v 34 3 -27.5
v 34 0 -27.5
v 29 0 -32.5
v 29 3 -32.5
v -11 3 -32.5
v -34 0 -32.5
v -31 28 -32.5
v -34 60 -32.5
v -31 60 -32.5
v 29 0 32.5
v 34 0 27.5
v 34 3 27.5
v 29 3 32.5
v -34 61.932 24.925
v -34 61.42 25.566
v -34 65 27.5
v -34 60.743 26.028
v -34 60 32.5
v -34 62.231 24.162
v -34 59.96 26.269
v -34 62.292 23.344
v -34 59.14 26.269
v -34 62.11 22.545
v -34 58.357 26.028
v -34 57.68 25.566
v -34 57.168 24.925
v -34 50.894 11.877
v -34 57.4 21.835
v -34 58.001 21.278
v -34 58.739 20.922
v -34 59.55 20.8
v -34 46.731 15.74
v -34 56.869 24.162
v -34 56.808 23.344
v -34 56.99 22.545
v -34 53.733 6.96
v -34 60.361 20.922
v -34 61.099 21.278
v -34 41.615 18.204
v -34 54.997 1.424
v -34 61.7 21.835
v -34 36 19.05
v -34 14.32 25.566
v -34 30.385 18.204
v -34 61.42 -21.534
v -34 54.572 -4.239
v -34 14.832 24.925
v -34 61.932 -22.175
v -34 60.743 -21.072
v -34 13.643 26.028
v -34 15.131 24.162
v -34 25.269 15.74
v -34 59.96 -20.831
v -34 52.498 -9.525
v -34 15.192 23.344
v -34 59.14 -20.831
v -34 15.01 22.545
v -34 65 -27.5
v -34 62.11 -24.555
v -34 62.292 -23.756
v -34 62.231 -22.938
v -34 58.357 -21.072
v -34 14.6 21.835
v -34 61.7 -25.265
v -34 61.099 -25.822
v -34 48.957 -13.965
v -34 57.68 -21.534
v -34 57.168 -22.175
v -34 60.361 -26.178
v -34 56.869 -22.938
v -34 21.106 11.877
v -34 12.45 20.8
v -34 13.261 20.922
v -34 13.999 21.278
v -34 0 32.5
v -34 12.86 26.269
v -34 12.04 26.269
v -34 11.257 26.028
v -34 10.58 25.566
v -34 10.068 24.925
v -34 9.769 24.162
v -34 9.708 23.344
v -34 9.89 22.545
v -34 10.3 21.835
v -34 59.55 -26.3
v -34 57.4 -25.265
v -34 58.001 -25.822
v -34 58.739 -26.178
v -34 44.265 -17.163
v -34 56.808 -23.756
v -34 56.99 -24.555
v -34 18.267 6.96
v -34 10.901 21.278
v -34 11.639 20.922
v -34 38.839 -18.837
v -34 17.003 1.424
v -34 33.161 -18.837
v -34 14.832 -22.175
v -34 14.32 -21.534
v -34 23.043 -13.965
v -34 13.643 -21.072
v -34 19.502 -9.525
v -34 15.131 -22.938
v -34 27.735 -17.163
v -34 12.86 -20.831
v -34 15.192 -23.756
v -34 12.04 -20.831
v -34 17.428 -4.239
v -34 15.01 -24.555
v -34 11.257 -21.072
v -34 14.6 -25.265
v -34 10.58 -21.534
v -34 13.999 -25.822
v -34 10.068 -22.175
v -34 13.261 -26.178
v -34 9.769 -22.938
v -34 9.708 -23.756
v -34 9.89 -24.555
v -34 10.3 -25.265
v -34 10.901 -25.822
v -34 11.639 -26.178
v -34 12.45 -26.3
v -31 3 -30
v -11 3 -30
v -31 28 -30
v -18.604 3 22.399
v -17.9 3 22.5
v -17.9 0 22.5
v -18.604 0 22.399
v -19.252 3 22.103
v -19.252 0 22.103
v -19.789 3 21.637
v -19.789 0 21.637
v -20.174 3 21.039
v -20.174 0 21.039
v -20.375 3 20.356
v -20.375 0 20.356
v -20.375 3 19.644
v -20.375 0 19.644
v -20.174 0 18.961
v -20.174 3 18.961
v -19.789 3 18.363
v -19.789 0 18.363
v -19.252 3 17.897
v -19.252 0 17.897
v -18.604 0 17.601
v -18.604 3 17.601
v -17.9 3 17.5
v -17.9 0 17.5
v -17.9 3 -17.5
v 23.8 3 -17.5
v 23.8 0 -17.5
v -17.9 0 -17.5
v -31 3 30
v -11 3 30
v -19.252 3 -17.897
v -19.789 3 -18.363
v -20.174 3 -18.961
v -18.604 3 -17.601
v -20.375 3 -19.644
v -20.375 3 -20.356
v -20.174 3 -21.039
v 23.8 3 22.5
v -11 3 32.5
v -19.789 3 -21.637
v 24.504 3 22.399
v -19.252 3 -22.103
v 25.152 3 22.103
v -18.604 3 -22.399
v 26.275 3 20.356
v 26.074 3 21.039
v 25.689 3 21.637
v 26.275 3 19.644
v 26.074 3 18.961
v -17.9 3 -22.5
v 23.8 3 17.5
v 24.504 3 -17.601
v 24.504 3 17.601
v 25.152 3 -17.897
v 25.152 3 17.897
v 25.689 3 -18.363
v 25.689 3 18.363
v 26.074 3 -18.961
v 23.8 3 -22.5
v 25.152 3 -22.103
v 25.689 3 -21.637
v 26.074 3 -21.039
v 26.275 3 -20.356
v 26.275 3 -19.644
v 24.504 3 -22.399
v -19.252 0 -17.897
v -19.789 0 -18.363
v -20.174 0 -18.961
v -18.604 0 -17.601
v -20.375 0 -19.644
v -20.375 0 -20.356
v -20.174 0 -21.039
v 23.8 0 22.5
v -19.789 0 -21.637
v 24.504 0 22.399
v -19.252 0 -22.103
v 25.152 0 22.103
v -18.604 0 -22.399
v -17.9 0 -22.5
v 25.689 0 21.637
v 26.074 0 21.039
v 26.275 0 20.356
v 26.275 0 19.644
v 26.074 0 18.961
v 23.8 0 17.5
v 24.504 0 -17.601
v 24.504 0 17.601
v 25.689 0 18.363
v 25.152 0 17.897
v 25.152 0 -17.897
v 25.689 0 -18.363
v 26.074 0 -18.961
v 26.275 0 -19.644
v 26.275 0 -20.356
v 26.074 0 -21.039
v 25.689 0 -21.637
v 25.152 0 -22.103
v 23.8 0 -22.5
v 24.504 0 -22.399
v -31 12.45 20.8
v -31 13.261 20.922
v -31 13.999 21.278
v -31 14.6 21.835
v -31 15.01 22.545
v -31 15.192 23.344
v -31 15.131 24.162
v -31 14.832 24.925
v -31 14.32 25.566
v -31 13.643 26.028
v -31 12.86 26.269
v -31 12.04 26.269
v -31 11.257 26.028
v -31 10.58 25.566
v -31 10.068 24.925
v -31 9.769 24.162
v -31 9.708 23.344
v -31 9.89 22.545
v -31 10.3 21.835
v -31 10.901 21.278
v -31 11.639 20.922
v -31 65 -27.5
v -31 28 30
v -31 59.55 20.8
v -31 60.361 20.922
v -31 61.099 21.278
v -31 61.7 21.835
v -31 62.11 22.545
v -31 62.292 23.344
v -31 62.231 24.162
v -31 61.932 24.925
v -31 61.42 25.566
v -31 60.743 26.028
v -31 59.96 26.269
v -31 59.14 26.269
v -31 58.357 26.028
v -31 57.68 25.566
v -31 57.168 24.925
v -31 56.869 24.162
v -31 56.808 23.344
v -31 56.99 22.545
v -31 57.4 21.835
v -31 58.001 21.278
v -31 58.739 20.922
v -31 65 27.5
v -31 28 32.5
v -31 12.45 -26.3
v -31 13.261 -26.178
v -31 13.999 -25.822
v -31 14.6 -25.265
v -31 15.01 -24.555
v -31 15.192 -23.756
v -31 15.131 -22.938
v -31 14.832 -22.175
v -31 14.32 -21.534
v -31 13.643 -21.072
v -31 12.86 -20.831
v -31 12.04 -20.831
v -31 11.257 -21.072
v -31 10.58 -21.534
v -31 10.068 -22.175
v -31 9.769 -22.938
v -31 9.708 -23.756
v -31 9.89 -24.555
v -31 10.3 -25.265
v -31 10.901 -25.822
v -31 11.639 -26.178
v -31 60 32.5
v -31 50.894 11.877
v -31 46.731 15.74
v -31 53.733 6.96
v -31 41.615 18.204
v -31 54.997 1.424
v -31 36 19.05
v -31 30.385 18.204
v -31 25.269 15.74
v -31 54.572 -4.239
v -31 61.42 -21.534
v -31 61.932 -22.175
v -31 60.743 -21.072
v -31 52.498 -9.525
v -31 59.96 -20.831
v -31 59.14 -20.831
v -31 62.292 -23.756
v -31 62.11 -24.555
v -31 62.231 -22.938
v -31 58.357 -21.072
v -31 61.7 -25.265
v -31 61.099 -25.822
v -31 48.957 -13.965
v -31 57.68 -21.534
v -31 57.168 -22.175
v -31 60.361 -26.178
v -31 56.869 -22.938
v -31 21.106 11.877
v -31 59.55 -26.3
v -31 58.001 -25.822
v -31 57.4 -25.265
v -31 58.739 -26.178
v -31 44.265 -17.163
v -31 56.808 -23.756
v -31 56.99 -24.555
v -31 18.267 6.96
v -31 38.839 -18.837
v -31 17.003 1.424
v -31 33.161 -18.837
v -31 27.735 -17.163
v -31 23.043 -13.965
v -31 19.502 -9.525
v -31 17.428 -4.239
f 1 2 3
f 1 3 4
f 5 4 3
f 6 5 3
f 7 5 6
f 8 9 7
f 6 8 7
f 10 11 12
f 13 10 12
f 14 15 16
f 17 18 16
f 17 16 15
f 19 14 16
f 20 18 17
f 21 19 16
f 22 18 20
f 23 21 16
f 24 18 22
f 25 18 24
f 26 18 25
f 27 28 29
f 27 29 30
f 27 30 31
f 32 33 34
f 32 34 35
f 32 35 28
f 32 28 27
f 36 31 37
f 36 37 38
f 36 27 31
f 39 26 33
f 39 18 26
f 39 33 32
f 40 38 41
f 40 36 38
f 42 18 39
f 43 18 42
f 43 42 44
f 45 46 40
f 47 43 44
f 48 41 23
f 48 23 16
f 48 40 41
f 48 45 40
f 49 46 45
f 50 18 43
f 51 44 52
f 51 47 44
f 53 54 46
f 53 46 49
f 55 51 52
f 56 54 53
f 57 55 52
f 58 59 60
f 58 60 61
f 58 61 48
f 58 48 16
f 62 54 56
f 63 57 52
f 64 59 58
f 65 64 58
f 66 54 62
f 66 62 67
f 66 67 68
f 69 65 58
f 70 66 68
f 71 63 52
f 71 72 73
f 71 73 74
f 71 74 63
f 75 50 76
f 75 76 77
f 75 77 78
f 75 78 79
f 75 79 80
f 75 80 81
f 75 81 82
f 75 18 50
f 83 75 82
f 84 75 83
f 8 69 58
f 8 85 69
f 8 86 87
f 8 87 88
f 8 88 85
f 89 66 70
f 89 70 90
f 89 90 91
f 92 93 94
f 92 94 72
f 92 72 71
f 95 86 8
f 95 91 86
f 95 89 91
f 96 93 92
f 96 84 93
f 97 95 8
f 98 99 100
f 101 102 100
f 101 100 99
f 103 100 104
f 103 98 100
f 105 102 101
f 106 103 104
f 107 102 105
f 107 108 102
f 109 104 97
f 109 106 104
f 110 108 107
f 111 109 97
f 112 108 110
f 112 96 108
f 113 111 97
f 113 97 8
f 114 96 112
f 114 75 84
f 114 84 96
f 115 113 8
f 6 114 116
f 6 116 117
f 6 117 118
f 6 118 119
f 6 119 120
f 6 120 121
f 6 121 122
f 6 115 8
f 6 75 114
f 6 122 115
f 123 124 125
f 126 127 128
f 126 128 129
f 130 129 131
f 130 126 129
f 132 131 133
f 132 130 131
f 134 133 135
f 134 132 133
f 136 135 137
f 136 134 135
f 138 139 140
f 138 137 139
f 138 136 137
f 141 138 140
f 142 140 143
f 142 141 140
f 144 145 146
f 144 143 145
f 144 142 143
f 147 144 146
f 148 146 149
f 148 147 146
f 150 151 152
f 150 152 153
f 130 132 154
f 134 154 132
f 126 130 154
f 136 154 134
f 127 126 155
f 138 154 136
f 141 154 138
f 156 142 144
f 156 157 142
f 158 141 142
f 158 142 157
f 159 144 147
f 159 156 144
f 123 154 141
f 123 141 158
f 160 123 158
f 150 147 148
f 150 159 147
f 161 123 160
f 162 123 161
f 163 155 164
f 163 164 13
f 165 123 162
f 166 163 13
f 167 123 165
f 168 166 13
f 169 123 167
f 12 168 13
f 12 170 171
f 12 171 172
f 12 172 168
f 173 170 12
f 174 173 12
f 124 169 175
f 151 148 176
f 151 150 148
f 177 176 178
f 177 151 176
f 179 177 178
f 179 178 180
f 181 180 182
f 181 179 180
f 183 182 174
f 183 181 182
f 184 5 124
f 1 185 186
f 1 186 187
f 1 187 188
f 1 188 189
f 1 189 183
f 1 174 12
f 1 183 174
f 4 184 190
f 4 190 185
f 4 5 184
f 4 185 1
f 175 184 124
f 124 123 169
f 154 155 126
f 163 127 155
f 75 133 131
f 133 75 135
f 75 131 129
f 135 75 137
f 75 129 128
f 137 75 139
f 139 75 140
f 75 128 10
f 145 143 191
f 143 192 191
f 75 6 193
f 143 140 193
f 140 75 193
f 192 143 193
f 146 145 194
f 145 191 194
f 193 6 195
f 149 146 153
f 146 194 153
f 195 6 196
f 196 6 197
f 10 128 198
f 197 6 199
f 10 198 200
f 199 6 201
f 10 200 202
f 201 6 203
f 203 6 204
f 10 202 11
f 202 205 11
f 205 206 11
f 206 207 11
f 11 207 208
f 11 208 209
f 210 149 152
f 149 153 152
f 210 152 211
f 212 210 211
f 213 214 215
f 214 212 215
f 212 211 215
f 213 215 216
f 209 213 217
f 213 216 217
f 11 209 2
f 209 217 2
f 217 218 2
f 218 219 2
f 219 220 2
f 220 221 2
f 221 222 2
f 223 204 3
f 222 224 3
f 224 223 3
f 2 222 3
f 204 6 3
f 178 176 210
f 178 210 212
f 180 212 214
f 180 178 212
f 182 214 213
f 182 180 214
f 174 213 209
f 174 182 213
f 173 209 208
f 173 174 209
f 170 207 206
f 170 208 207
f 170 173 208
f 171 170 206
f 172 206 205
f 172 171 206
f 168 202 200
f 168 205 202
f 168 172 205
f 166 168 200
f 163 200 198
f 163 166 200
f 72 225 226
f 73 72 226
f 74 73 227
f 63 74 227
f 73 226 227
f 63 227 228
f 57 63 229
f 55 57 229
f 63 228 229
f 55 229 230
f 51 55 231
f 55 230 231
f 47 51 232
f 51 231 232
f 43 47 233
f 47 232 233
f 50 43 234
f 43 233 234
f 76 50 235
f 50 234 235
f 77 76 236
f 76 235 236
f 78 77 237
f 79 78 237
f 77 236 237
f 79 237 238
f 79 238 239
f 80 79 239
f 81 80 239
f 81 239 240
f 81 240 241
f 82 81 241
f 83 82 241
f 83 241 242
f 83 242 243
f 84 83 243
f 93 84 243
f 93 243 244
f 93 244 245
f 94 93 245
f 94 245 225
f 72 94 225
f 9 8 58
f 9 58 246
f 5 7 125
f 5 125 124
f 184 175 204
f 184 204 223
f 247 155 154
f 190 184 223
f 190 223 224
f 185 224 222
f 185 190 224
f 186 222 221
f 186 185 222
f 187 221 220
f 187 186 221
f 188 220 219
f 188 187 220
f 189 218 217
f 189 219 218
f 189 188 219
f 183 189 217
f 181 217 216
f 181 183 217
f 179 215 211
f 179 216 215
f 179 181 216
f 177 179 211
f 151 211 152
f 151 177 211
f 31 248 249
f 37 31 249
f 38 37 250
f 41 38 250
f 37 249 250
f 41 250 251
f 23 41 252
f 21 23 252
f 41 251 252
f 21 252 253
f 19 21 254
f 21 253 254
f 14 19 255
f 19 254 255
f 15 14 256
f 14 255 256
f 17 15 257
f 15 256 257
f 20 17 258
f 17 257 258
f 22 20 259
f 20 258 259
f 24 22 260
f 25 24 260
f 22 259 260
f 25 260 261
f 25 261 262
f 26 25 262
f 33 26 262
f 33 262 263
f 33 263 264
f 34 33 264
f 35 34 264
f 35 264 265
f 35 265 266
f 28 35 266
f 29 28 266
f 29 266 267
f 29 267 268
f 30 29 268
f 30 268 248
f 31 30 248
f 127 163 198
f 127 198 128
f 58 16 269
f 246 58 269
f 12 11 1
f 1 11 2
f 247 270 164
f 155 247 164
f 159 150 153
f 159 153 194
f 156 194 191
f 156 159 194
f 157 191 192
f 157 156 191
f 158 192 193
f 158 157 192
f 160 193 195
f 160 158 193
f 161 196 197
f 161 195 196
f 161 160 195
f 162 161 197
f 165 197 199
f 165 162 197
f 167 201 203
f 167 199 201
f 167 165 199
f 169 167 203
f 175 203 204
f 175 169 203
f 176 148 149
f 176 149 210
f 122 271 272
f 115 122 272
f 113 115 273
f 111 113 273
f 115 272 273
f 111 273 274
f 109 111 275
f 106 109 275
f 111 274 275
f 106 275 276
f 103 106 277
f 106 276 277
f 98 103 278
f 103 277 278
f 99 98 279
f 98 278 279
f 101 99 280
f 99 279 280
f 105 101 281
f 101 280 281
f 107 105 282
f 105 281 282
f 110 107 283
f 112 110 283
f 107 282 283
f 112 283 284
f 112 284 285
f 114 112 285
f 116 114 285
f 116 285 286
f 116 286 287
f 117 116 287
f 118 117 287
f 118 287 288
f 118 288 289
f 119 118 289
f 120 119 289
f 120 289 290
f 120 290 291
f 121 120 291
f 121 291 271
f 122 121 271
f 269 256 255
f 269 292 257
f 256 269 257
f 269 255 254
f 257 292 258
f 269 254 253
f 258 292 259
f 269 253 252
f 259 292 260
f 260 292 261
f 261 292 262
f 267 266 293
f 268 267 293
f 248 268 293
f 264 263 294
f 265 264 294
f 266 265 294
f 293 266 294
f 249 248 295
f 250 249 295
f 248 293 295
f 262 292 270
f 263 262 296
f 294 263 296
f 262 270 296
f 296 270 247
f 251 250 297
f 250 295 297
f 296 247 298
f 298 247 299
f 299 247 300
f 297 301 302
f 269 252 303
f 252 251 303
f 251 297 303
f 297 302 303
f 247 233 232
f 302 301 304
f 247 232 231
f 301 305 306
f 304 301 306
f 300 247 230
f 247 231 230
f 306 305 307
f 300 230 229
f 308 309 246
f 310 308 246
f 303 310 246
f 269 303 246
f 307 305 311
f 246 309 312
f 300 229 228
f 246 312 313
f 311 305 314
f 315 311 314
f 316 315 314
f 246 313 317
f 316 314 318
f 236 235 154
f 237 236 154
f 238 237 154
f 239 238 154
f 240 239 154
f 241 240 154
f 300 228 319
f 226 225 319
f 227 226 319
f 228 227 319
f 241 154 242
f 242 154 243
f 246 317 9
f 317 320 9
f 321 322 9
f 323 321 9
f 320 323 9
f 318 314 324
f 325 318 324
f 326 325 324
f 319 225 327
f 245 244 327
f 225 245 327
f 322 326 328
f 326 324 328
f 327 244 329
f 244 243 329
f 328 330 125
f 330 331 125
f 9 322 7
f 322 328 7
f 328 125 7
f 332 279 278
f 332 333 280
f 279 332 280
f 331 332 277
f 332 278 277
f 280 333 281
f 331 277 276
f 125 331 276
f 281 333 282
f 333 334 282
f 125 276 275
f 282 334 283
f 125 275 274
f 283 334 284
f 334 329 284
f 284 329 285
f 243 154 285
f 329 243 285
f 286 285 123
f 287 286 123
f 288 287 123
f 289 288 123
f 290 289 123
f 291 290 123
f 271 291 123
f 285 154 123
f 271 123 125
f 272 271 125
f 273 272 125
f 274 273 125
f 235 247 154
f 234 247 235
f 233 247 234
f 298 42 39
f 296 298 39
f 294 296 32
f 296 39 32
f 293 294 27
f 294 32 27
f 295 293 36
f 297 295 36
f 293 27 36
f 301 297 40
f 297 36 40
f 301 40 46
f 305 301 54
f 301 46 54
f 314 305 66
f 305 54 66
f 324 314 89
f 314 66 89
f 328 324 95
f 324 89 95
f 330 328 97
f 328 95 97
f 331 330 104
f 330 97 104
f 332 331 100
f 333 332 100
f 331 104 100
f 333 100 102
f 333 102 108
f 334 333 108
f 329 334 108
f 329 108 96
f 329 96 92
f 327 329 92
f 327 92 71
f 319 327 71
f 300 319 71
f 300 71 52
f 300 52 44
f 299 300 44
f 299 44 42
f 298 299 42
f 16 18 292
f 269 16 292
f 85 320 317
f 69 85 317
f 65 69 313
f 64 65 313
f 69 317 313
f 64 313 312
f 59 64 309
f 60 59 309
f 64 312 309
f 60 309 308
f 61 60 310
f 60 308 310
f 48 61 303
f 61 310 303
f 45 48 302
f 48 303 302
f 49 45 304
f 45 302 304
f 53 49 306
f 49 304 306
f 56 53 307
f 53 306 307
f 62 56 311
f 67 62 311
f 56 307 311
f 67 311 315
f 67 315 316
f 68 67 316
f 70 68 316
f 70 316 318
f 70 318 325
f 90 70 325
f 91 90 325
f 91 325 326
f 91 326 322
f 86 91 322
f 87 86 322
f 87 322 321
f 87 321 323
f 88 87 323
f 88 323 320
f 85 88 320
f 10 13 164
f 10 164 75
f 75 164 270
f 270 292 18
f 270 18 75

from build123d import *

# Parameters (mm, degrees)
SKETCH2_W                  = 68
SKETCH2_H                  = 65
BOSS_EXTRUDE1_DEPTH        = 3
SKETCH3_W                  = 3
SKETCH3_H                  = 65
BOSS_EXTRUDE2_DEPTH        = 62
CUT_EXTRUDE1_DEPTH         = 78.821912081
SKETCH5_R                  = 19.05
CUT_EXTRUDE2_DEPTH         = 100.525122457
F_5_5_5_5_DIAMETER_HOLE1_D = 5.5
CHAMFER1_SIZE              = 5
CHAMFER2_SIZE              = 5
CHAMFER3_SIZE              = 5
BOSS_EXTRUDE3_DEPTH        = 2.5
BOSS_EXTRUDE4_DEPTH        = 2.5


with BuildPart() as part:
    # Sketch2 → Boss-Extrude1 (new body)
    with BuildSketch(Plane(origin=(0, 0, 0), x_dir=(1, 0, 0), z_dir=(0, 1, 0))):
        Rectangle(SKETCH2_W, SKETCH2_H)
    extrude(amount=BOSS_EXTRUDE1_DEPTH)

    # Sketch3 → Boss-Extrude2 (add)
    with BuildSketch(Plane(origin=(0, 3, 0), x_dir=(1, 0, 0), z_dir=(0, 1, 0))):
        with Locations((-32.5, 0)):
            Rectangle(SKETCH3_W, SKETCH3_H)
    extrude(amount=BOSS_EXTRUDE2_DEPTH)

    # Sketch4 → Cut-Extrude1 (cut, through all)
    with BuildSketch(Plane(origin=(0, 3, 0), x_dir=(1, 0, 0), z_dir=(0, 1, 0))):
        with BuildLine():
            Line((-17.9, 22.5), (23.8, 22.5))
            ThreePointArc((23.8, 22.5), (26.3, 20), (23.8, 17.5))
            Line((23.8, 17.5), (-17.9, 17.5))
            ThreePointArc((-17.9, 17.5), (-20.4, 20), (-17.9, 22.5))
        make_face()
        with BuildLine():
            Line((-17.9, -17.5), (23.8, -17.5))
            ThreePointArc((23.8, -17.5), (26.3, -20), (23.8, -22.5))
            Line((23.8, -22.5), (-17.9, -22.5))
            ThreePointArc((-17.9, -22.5), (-20.4, -20), (-17.9, -17.5))
        make_face()
    extrude(amount=-CUT_EXTRUDE1_DEPTH, mode=Mode.SUBTRACT)

    # Sketch5 → Cut-Extrude2 (cut, through all)
    with BuildSketch(Plane.ZY.offset(34)):
        with Locations((0, 36)):
            Circle(SKETCH5_R)
    extrude(amount=-CUT_EXTRUDE2_DEPTH, mode=Mode.SUBTRACT)

    # Ø5.5 (5.5) Diameter Hole1 (through all)
    with Locations(Plane.ZY.offset(34)):
        with Locations((23.55, 59.55), (-23.55, 59.55), (-23.55, 12.45), (23.55, 12.45)):
            Hole(F_5_5_5_5_DIAMETER_HOLE1_D / 2)

    # Chamfer1
    chamfer1_edges = [part.edges().sort_by_distance(p)[0] for p in [
        (-32.5, 65, -32.5),
    ]]
    chamfer(chamfer1_edges, length=CHAMFER1_SIZE)

    # Chamfer2
    chamfer2_edges = [part.edges().sort_by_distance(p)[0] for p in [
        (-32.5, 65, 32.5),
    ]]
    chamfer(chamfer2_edges, length=CHAMFER2_SIZE)

    # Chamfer3
    chamfer3_edges = [part.edges().sort_by_distance(p)[0] for p in [
        (34, 1.5, 32.5),
        (34, 1.5, -32.5),
    ]]
    chamfer(chamfer3_edges, length=CHAMFER3_SIZE)

    # Sketch8 → Boss-Extrude3 (add)
    with BuildSketch(Plane.XY.offset(32.5)):
        Polygon((-31, 3), (-31, 28), (-11, 3), align=None)
    extrude(amount=-BOSS_EXTRUDE3_DEPTH)

    # Sketch9 → Boss-Extrude4 (add)
    with BuildSketch(Plane(origin=(0, 0, -32.5), x_dir=(-1, 0, 0), z_dir=(0, 0, -1))):
        Polygon((31, 3), (31, 28), (11, 3), align=None)
    extrude(amount=-BOSS_EXTRUDE4_DEPTH)


solid = part.part
